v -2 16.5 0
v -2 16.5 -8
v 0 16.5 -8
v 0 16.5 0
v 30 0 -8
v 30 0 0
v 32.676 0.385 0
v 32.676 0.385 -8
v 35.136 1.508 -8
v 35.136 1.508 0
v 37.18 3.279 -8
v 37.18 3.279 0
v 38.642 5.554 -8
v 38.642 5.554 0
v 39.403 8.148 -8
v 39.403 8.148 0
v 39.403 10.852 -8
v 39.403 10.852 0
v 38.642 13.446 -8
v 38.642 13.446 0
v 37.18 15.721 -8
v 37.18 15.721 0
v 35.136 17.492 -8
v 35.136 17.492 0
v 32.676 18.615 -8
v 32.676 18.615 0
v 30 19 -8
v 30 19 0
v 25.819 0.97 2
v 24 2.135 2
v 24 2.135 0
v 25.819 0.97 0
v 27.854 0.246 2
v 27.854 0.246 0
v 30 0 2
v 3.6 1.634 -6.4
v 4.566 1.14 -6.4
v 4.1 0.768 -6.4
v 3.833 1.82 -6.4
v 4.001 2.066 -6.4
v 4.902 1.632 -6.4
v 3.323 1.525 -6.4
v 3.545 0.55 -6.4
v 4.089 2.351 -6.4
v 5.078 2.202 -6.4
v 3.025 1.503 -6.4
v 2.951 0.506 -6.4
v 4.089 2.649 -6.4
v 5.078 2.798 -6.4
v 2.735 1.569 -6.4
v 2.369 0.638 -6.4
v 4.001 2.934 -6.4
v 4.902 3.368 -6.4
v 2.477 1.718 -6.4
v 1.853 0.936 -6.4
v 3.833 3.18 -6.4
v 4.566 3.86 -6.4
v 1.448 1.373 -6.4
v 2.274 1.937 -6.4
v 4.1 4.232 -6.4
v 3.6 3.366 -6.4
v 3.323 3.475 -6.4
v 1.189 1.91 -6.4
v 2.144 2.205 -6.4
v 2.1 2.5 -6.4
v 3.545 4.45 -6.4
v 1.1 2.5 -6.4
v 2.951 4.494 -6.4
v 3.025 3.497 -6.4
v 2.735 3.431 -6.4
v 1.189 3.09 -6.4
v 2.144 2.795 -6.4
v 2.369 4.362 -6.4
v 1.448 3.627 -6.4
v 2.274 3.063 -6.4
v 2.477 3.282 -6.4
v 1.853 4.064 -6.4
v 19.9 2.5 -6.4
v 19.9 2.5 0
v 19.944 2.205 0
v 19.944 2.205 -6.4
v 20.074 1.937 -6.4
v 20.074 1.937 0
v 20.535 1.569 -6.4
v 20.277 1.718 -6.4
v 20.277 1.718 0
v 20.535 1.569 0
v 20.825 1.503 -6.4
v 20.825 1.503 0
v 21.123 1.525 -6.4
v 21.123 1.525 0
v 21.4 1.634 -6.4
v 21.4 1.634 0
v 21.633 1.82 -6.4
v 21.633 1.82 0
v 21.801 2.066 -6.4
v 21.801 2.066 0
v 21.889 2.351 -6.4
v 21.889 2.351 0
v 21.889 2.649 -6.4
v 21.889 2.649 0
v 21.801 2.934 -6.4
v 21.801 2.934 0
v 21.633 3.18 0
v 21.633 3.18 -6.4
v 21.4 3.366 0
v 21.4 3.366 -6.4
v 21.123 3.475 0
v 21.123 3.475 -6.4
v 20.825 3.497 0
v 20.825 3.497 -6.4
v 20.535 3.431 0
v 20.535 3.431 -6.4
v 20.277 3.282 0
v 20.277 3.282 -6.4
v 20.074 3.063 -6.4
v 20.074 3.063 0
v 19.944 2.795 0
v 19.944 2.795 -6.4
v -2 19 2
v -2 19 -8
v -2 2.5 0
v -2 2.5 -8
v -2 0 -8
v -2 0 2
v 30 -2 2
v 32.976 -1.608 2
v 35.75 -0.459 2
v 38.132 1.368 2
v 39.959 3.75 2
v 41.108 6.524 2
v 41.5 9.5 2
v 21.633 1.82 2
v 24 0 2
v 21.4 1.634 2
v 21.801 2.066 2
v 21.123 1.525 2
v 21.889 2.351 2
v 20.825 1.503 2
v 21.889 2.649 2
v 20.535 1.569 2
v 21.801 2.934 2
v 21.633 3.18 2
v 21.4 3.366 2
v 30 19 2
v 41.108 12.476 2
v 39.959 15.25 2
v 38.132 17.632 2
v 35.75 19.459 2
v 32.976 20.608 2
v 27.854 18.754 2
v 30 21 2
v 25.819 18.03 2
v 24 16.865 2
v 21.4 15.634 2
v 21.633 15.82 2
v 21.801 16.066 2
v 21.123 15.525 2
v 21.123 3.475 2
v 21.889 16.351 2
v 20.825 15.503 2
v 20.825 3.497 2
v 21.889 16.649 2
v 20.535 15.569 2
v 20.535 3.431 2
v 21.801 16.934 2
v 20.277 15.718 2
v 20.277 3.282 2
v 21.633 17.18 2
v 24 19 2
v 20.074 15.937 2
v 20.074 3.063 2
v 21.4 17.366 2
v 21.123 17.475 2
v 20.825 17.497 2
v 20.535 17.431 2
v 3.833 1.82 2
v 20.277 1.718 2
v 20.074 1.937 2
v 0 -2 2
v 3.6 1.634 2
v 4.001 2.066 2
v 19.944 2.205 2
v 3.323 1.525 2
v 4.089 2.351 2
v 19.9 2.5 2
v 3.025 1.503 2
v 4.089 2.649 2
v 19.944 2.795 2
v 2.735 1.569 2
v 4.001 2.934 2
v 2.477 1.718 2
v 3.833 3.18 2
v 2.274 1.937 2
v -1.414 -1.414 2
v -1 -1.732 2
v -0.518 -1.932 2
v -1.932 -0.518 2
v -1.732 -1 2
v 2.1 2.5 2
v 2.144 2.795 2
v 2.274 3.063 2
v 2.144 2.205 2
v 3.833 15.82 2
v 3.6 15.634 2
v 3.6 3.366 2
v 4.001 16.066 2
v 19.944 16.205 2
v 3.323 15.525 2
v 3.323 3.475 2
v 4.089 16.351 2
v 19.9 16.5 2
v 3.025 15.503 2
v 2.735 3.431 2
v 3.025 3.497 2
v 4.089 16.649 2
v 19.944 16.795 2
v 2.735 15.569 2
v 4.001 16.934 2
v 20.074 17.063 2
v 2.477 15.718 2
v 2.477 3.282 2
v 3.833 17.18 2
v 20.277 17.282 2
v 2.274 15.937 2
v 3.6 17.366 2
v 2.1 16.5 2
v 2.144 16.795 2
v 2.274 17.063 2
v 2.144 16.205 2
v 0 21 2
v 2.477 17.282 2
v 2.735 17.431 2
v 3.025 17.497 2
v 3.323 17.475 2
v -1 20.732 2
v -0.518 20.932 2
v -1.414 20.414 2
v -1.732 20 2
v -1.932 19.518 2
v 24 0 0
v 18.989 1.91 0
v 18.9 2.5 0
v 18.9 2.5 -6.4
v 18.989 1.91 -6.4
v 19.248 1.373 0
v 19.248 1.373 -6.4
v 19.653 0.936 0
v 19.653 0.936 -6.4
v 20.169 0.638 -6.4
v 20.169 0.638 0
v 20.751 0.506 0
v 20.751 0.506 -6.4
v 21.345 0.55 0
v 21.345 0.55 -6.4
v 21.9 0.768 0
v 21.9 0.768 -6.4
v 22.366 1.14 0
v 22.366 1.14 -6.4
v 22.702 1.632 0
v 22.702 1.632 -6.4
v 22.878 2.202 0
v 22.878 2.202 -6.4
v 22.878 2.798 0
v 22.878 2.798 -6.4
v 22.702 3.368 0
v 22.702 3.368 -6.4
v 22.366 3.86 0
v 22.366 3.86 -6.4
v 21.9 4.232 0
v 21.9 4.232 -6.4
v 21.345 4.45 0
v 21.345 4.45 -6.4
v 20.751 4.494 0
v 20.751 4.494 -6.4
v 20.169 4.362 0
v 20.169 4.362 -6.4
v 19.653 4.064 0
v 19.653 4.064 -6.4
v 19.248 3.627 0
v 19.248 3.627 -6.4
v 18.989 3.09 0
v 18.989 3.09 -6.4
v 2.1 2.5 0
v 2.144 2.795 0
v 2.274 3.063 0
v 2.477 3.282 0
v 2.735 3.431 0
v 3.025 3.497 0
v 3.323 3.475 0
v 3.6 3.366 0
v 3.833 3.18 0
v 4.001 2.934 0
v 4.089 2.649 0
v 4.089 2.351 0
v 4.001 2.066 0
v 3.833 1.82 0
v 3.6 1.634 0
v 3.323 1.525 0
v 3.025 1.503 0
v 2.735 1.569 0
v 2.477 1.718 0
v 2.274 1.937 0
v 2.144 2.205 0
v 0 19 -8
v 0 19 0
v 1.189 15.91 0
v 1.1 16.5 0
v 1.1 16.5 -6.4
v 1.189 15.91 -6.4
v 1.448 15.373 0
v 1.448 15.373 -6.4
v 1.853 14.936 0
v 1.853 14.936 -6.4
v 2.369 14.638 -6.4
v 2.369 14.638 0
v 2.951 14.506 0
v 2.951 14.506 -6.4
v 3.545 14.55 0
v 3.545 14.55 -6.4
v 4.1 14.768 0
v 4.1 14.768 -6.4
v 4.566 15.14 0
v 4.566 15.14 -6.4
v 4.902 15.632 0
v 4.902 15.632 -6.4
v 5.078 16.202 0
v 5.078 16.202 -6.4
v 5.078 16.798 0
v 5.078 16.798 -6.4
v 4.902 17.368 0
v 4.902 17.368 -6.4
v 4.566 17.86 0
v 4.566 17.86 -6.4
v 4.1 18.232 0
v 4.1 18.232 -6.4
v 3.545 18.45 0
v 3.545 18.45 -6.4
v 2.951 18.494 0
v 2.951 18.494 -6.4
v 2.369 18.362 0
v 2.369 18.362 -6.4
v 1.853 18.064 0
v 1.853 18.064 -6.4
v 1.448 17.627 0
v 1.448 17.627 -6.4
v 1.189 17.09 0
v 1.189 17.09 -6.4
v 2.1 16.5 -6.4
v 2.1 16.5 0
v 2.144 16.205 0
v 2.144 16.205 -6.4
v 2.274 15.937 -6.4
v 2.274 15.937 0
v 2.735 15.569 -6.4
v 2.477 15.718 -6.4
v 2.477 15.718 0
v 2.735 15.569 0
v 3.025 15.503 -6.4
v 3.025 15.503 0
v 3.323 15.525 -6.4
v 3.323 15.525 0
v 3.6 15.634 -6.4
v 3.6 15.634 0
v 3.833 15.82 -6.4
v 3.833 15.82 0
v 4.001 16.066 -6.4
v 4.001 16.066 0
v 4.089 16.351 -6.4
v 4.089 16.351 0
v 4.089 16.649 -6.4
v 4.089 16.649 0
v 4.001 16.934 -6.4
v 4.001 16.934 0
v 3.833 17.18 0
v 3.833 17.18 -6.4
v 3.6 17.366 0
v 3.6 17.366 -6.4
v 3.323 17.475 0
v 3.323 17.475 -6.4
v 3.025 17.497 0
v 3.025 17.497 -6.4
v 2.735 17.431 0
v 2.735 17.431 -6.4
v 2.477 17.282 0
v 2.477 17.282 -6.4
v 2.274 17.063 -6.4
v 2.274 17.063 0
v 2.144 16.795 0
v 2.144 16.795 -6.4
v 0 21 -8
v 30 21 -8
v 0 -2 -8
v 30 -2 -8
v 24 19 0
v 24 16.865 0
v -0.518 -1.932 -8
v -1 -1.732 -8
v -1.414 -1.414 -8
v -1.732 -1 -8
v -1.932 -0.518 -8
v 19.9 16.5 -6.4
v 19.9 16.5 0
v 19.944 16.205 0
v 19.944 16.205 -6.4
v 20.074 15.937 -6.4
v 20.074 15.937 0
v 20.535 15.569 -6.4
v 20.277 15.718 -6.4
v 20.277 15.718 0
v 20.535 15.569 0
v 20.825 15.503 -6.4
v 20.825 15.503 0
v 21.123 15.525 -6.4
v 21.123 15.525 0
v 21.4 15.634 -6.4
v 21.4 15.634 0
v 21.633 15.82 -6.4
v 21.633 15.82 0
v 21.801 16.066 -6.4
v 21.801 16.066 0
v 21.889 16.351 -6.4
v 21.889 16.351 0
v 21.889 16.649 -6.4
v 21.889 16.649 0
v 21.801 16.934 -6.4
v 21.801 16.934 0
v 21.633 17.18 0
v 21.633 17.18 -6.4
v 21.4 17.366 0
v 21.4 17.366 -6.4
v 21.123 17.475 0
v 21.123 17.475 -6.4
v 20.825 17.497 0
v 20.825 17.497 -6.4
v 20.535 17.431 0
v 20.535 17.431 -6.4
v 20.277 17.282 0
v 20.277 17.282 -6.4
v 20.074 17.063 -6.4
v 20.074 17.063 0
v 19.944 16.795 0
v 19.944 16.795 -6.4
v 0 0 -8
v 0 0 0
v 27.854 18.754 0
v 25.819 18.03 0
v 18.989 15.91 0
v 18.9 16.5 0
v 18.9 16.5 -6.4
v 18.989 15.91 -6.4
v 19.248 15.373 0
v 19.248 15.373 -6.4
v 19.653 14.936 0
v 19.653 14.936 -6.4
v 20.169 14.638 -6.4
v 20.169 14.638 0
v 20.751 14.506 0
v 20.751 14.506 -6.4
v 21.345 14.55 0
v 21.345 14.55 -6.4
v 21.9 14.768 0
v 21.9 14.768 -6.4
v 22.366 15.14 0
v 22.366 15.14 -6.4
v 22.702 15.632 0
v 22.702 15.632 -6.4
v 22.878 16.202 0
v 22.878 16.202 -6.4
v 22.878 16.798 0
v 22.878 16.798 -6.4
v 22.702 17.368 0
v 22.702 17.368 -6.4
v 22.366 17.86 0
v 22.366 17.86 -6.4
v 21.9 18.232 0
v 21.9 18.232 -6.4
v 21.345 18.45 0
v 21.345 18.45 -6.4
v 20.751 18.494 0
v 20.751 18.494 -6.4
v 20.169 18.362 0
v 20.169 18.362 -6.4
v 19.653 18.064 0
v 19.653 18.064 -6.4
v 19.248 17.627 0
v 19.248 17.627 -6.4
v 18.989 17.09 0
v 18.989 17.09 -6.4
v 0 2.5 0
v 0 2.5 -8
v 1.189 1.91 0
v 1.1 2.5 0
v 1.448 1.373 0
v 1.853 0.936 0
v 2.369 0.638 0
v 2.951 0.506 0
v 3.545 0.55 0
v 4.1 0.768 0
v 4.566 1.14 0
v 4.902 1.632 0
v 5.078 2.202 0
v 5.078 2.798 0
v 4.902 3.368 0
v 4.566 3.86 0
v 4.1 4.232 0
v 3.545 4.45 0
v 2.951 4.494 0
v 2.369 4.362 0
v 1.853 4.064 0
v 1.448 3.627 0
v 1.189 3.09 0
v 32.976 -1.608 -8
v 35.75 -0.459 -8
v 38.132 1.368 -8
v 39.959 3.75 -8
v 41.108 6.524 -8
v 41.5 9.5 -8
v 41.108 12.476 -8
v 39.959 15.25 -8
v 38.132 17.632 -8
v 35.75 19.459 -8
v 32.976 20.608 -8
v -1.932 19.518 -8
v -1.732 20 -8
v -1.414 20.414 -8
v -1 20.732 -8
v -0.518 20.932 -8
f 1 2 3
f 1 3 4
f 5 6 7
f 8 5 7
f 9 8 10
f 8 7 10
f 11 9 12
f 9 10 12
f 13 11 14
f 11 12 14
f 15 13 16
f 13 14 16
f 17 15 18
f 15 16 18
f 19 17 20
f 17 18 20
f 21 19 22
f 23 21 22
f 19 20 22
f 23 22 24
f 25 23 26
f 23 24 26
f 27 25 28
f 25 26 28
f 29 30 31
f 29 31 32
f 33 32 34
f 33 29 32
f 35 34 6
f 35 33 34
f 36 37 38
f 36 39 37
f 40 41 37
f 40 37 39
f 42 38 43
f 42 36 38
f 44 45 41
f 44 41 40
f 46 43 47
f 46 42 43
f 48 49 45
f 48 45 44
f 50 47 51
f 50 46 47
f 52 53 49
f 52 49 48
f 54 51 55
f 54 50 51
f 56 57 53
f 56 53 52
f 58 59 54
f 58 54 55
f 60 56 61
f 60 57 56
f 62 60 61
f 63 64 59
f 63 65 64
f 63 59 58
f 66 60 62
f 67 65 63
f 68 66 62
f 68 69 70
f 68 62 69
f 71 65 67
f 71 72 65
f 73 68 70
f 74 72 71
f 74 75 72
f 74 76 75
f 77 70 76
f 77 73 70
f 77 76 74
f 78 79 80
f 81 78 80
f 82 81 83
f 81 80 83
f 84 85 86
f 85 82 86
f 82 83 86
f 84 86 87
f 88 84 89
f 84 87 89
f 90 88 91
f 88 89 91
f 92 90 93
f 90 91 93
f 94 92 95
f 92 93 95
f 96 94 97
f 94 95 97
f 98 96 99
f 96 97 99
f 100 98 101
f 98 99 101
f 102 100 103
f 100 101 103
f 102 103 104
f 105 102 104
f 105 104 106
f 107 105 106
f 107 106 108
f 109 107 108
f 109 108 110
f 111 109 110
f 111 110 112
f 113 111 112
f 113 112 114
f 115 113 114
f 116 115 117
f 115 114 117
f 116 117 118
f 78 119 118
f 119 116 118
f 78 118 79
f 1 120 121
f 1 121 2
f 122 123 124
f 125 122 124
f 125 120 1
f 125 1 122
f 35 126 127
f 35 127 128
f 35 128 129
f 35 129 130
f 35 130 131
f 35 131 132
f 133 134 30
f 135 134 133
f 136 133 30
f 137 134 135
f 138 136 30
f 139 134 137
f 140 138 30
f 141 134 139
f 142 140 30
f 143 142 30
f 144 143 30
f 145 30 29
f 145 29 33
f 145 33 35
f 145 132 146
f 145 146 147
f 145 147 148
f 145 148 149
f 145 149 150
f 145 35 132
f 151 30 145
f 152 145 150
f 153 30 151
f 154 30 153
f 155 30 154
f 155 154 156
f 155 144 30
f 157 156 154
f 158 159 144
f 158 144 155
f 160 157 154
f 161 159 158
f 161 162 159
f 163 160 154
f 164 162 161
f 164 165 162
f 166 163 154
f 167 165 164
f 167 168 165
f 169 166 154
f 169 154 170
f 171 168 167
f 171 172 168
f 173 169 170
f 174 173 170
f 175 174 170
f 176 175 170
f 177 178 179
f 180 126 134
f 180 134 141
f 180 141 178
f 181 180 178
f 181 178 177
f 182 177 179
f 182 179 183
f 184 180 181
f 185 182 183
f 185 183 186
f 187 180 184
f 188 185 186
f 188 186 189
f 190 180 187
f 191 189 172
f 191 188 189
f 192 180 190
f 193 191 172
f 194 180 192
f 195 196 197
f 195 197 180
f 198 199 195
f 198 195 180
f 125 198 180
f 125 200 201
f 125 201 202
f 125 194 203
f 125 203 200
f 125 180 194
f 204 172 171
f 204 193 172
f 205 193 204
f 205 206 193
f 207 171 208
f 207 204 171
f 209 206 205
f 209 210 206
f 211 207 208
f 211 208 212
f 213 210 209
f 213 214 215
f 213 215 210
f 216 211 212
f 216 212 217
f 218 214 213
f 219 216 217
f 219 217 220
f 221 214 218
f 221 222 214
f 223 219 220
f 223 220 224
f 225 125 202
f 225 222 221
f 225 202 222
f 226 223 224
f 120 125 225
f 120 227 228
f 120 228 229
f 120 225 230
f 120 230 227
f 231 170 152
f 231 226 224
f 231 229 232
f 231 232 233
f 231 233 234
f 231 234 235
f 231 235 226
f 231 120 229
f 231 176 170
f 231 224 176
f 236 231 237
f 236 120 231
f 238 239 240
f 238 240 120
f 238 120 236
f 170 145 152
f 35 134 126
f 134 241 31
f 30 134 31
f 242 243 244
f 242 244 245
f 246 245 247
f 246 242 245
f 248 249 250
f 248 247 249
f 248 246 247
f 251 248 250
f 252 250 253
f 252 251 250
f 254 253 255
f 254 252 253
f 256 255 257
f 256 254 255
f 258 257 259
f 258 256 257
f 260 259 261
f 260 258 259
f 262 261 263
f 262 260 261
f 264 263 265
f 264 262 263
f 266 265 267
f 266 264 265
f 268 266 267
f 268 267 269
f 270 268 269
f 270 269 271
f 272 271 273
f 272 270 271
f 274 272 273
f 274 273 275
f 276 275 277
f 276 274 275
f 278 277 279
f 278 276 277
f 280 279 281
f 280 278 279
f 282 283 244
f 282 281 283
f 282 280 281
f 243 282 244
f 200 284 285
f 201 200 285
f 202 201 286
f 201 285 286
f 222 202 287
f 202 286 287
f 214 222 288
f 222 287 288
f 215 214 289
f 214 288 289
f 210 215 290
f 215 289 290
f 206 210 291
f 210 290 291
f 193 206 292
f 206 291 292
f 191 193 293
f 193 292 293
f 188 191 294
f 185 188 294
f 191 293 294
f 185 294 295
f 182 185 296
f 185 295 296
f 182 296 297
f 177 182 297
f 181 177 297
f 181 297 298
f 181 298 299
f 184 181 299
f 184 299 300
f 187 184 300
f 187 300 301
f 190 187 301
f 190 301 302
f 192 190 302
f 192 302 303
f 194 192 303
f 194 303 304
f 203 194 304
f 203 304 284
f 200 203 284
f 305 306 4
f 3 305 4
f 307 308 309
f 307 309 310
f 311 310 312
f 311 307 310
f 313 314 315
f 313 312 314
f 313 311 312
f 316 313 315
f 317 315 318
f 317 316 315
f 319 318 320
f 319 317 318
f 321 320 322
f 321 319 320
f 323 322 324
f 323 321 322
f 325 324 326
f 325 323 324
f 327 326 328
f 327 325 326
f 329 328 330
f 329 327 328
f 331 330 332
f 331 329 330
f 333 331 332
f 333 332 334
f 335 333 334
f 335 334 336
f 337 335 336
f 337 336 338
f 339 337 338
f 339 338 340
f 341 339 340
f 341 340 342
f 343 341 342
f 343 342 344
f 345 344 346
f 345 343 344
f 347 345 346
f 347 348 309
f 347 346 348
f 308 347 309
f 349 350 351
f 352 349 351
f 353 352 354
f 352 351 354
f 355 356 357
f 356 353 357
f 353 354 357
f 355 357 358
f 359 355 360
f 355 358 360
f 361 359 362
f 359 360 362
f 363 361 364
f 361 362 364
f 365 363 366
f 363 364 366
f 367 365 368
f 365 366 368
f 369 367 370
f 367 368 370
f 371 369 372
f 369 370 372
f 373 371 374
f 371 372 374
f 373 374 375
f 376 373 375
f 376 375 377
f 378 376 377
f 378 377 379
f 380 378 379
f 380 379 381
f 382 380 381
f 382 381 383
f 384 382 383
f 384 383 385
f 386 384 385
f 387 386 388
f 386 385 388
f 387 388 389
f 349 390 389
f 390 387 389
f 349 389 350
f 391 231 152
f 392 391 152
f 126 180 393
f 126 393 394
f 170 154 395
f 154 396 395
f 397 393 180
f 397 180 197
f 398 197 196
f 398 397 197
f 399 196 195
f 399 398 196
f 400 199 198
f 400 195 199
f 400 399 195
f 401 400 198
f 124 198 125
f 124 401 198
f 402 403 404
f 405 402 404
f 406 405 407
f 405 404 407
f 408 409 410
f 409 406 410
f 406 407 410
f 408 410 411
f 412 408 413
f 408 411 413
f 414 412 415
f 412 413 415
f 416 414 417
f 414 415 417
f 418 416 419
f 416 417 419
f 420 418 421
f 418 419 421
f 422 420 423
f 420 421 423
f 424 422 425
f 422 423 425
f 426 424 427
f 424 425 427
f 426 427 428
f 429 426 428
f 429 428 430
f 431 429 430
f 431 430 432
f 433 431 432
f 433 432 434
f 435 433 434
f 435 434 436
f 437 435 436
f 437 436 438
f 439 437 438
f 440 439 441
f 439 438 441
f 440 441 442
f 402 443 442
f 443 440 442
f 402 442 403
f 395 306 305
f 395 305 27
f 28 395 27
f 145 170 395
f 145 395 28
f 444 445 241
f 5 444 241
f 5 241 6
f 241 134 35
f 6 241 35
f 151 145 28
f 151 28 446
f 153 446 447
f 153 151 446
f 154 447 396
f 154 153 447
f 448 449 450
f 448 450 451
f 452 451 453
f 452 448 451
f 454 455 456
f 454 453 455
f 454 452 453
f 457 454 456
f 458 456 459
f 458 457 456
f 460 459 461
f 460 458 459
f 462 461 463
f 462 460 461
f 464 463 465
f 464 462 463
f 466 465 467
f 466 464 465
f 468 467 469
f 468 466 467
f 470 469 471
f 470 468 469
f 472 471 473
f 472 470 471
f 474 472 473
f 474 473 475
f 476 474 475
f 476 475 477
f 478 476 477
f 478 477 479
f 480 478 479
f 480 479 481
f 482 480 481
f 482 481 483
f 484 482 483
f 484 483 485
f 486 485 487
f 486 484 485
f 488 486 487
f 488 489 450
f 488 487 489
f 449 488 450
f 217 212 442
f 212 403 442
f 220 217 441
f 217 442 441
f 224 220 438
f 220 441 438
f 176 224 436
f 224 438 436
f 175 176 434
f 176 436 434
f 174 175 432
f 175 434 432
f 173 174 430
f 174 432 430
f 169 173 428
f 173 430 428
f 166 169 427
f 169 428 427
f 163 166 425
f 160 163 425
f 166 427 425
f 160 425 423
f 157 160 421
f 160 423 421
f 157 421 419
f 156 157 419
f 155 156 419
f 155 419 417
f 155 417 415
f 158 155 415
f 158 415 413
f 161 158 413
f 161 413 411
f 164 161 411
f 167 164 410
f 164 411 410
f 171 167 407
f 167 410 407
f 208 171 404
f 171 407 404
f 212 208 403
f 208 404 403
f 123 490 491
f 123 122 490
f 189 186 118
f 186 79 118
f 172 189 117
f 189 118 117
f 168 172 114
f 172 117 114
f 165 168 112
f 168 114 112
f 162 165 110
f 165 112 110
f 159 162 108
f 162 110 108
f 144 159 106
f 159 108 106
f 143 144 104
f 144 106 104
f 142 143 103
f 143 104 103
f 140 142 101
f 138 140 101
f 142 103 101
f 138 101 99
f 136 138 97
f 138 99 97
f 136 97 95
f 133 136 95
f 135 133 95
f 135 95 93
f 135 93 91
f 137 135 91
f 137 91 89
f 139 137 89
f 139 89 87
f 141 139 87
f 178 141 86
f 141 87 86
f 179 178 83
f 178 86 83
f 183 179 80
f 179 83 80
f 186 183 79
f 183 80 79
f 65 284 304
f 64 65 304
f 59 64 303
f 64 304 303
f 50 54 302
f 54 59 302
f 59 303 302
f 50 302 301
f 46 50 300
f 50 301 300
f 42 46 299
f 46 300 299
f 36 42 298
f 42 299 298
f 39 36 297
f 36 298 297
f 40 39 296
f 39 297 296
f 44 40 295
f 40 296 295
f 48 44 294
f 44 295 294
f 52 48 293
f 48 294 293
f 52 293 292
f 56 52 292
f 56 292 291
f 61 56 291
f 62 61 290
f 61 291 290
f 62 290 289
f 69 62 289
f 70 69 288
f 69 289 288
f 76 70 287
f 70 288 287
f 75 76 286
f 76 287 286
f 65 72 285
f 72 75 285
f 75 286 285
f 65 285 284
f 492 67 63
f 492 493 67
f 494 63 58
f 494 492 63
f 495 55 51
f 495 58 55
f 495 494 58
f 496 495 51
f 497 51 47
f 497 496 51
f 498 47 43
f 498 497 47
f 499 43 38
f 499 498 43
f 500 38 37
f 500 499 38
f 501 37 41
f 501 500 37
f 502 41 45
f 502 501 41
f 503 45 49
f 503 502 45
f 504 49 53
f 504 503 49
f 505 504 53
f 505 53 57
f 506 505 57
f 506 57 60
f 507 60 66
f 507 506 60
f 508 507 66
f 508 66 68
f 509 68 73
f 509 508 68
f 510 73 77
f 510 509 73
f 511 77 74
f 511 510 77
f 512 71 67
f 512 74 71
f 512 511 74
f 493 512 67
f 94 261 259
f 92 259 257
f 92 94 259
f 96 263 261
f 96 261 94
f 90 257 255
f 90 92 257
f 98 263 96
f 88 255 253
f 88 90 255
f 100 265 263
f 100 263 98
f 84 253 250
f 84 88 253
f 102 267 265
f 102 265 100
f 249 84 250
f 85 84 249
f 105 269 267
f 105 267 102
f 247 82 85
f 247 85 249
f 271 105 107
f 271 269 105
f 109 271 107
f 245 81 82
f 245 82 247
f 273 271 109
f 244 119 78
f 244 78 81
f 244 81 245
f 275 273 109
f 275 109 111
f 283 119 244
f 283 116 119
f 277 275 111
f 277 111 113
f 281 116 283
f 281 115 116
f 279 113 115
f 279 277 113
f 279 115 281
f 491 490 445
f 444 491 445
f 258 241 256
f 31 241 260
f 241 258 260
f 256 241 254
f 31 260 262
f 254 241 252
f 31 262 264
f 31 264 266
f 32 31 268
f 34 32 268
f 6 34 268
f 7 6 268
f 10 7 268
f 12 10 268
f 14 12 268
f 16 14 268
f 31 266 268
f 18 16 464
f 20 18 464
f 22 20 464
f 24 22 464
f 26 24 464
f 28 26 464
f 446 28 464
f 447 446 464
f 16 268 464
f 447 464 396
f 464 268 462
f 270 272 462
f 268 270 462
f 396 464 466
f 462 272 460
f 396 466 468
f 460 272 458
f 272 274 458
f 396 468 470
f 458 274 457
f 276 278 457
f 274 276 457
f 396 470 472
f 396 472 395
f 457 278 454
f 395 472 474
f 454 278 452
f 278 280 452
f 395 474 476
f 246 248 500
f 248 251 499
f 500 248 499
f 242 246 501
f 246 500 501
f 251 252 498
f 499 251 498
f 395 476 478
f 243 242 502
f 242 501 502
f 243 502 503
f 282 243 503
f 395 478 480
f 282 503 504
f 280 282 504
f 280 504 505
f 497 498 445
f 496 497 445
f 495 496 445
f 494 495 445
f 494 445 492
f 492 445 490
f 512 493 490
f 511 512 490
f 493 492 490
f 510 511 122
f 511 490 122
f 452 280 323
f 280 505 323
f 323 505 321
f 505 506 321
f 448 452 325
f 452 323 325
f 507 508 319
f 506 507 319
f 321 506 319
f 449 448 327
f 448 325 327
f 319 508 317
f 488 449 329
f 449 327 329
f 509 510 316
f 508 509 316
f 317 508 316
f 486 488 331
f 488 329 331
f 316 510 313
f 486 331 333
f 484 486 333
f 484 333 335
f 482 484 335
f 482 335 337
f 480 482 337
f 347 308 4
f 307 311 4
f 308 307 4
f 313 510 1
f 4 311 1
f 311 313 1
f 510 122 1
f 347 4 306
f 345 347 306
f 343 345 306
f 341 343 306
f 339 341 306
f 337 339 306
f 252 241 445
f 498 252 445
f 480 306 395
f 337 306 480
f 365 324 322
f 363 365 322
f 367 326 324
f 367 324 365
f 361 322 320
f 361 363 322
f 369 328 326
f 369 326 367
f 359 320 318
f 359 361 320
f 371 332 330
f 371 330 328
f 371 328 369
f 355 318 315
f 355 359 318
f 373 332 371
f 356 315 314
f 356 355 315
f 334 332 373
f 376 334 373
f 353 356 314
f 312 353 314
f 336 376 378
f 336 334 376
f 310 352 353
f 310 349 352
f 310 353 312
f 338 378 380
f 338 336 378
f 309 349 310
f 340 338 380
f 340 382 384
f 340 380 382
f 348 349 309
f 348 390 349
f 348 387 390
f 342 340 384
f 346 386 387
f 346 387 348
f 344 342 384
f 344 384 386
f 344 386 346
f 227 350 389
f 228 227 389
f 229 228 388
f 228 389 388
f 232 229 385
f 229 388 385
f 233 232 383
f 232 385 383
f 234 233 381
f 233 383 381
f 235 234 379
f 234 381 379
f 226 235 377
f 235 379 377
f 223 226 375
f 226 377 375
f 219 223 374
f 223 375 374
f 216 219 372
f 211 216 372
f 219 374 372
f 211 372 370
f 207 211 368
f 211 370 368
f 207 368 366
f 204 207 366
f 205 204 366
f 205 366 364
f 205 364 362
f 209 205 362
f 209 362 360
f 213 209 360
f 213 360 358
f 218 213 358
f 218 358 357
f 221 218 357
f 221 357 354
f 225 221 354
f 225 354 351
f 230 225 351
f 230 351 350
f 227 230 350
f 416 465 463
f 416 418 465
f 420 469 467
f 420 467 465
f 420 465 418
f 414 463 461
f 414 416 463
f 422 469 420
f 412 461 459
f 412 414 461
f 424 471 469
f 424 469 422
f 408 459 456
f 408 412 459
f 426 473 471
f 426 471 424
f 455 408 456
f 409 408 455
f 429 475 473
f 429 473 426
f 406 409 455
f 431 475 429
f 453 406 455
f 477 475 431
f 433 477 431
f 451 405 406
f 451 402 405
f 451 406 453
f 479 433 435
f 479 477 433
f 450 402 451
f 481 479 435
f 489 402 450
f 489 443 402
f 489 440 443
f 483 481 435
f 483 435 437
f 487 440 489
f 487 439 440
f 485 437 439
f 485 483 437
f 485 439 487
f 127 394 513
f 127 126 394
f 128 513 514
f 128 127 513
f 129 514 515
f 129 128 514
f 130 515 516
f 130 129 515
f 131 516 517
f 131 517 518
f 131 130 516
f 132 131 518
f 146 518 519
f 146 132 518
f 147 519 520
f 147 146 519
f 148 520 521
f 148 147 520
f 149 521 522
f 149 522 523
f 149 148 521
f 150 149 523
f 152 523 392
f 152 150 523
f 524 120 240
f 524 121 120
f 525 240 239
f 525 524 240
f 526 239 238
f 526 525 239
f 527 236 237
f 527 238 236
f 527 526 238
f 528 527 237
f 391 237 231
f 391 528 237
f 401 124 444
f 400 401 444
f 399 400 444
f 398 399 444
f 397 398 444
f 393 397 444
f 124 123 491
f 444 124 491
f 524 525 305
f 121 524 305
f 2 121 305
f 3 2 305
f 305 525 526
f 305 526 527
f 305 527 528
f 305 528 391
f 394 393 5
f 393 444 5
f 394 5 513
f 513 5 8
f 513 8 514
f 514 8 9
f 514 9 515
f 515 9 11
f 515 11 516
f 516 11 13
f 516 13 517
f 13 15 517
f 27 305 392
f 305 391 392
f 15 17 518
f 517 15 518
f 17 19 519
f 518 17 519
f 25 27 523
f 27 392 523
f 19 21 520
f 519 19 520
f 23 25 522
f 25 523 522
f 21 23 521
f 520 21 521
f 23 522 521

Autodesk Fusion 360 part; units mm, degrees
sketch "Sketch1" plane through (0, 0, 0) normal (0, 0, 1) x (1, 0, 0)
  line L0 (0, 0) -> (24, 0)
  line L1 (24, 0) -> (24, 19)
  line L2 (24, 19) -> (0, 19)
  line L3 (0, 19) -> (0, 0)
  dimension "d1" = 24
  dimension "d2" = 19
extrude "Extrude1" add sketch "Sketch1" along normal blind 2
sketch "Sketch4" plane through (0, 0, 2) normal (0, 0, 1) x (1, 0, 0)
  line L0 (0, 19) -> (0, 0)
  line L1 (0, 0) -> (24, 0)
  line L2 (24, 0) -> (24, 19)
  line L3 (24, 19) -> (0, 19)
  line L4 (24.6466, 21) -> (-2, 21)
  line L5 (-2, 21) -> (-2, -2)
  line L6 (-2, -2) -> (24.6466, -2)
  line L7 (24.6466, -2) -> (30, -2)
  line L8 (24.6466, 21) -> (30, 21)
  line L9 (30, 21) -> (30, -2) construction
  arc A0 (30, -2) -> (30, 21) centre (30, 9.5) ccw
  line L10 (24, 19) -> (30, 19)
  line L11 (24, 0) -> (30, 0)
  arc A1 (30, 0) -> (30, 19) centre (30, 9.5) ccw
  dimension "d23" = 2
  dimension "d24" = 2
  dimension "d25" = 2
  dimension "d26" = 6
  dimension "d27" = 19
extrude "Extrude5" add sketch "Sketch4" against normal blind 10
sketch "Sketch5" plane through (-2, 0, 0) normal (-1, 0, 0) x (0, 0, 1)
  line L0 (2, -2) -> (2, 21)
  line L1 (2, 21) -> (-8, 21)
  line L2 (-8, 21) -> (-8, -2)
  line L3 (-8, -2) -> (2, -2)
  line L4 (-8, 16.5) -> (0, 16.5)
  line L5 (0, 16.5) -> (0, 2.5)
  line L6 (0, 2.5) -> (-8, 2.5)
  line L7 (-8, 2.5) -> (-8, 16.5)
  dimension "d30" = 8
  dimension "d31" = 14
extrude "Extrude6" cut sketch "Sketch5" against normal up to surface (2 mm away) contours L2 L4 L5 L6 L7
fillet "Fillet1" radius 2 2 edges at (-2, 21, -3) (-2, -2, -3)
extrude "Extrude7" add 1 faces at (24, 6.3333, 0.6667) along direction (1, 0, 0) up to surface end surface at (33.2492, 18.4271, -4.6667)
sketch "Sketch6" plane through (0, 0, 0) normal (0, 0, -1) x (-1, 0, 0)
  line L0 (0, 16.5) -> (0, 19) construction
  line L1 (0, 19) -> (-30, 19)
  arc A0 (-30, 19) -> (-30, 0) centre (-30, 9.5) ccw
  line L2 (-30, 0) -> (0, 0)
  line L3 (0, 0) -> (0, 2.5) construction
  line L4 (0, 2.5) -> (2, 2.5) construction
  line L5 (2, 2.5) -> (2, 16.5) construction
  line L6 (2, 16.5) -> (0, 16.5) construction
  line L7 (-24, 19) -> (0, 19) construction
  line L8 (0, 19) -> (0, 0) construction
  line L9 (0, 0) -> (-24, 0) construction
  line L10 (-24, 0) -> (-24, 19) construction
  line L11 (-20.9, 16.5) -> (-3.1, 16.5) construction
  line L12 (-3.1, 16.5) -> (-3.1, 2.5) construction
  line L13 (-3.1, 2.5) -> (-20.9, 2.5) construction
  line L14 (-20.9, 2.5) -> (-20.9, 16.5) construction
  line L15 (-20.9, 2.5) -> (-3.1, 16.5) construction
  line L16 (-24, 19) -> (0, 0) construction
  circle A1 centre (-20.9, 16.5) radius 1
  circle A2 centre (-3.1, 16.5) radius 1
  circle A3 centre (-3.1, 2.5) radius 1
  circle A4 centre (-20.9, 2.5) radius 1
  point P0 (-24, 19)
  dimension "d38" = 17.8
  dimension "d39" = 14
  dimension "d40" = 2
extrude "Extrude8" cut sketch "Sketch6" against normal up to surface (2 mm away)
sketch "Sketch7" plane through (0, 0, 0) normal (0, 0, -1) x (-1, 0, 0)
  circle A0 centre (-3.1, 16.5) radius 1
  circle A1 centre (-20.9, 16.5) radius 1
  circle A2 centre (-3.1, 2.5) radius 1
  circle A3 centre (-20.9, 2.5) radius 1
  line L0 (0, 16.5) -> (0, 19)
  line L1 (0, 19) -> (-30, 19)
  arc A4 (-30, 19) -> (-30, 0) centre (-30, 9.5) ccw
  line L2 (-30, 0) -> (0, 0)
  line L3 (0, 0) -> (0, 2.5)
  line L4 (0, 2.5) -> (2, 2.5)
  line L5 (2, 2.5) -> (2, 16.5)
  line L6 (2, 16.5) -> (0, 16.5)
  circle A5 centre (-20.9, 16.5) radius 2
  circle A6 centre (-3.1, 16.5) radius 2
  circle A7 centre (-3.1, 2.5) radius 2
  circle A8 centre (-20.9, 2.5) radius 2
  dimension "d43" = 4
extrude "Extrude9" add sketch "Sketch7" along normal up to surface (6.4 mm away) contours A5 | A6 | A7 | A8
equation "d27 = 23 mm - 4 mm"
